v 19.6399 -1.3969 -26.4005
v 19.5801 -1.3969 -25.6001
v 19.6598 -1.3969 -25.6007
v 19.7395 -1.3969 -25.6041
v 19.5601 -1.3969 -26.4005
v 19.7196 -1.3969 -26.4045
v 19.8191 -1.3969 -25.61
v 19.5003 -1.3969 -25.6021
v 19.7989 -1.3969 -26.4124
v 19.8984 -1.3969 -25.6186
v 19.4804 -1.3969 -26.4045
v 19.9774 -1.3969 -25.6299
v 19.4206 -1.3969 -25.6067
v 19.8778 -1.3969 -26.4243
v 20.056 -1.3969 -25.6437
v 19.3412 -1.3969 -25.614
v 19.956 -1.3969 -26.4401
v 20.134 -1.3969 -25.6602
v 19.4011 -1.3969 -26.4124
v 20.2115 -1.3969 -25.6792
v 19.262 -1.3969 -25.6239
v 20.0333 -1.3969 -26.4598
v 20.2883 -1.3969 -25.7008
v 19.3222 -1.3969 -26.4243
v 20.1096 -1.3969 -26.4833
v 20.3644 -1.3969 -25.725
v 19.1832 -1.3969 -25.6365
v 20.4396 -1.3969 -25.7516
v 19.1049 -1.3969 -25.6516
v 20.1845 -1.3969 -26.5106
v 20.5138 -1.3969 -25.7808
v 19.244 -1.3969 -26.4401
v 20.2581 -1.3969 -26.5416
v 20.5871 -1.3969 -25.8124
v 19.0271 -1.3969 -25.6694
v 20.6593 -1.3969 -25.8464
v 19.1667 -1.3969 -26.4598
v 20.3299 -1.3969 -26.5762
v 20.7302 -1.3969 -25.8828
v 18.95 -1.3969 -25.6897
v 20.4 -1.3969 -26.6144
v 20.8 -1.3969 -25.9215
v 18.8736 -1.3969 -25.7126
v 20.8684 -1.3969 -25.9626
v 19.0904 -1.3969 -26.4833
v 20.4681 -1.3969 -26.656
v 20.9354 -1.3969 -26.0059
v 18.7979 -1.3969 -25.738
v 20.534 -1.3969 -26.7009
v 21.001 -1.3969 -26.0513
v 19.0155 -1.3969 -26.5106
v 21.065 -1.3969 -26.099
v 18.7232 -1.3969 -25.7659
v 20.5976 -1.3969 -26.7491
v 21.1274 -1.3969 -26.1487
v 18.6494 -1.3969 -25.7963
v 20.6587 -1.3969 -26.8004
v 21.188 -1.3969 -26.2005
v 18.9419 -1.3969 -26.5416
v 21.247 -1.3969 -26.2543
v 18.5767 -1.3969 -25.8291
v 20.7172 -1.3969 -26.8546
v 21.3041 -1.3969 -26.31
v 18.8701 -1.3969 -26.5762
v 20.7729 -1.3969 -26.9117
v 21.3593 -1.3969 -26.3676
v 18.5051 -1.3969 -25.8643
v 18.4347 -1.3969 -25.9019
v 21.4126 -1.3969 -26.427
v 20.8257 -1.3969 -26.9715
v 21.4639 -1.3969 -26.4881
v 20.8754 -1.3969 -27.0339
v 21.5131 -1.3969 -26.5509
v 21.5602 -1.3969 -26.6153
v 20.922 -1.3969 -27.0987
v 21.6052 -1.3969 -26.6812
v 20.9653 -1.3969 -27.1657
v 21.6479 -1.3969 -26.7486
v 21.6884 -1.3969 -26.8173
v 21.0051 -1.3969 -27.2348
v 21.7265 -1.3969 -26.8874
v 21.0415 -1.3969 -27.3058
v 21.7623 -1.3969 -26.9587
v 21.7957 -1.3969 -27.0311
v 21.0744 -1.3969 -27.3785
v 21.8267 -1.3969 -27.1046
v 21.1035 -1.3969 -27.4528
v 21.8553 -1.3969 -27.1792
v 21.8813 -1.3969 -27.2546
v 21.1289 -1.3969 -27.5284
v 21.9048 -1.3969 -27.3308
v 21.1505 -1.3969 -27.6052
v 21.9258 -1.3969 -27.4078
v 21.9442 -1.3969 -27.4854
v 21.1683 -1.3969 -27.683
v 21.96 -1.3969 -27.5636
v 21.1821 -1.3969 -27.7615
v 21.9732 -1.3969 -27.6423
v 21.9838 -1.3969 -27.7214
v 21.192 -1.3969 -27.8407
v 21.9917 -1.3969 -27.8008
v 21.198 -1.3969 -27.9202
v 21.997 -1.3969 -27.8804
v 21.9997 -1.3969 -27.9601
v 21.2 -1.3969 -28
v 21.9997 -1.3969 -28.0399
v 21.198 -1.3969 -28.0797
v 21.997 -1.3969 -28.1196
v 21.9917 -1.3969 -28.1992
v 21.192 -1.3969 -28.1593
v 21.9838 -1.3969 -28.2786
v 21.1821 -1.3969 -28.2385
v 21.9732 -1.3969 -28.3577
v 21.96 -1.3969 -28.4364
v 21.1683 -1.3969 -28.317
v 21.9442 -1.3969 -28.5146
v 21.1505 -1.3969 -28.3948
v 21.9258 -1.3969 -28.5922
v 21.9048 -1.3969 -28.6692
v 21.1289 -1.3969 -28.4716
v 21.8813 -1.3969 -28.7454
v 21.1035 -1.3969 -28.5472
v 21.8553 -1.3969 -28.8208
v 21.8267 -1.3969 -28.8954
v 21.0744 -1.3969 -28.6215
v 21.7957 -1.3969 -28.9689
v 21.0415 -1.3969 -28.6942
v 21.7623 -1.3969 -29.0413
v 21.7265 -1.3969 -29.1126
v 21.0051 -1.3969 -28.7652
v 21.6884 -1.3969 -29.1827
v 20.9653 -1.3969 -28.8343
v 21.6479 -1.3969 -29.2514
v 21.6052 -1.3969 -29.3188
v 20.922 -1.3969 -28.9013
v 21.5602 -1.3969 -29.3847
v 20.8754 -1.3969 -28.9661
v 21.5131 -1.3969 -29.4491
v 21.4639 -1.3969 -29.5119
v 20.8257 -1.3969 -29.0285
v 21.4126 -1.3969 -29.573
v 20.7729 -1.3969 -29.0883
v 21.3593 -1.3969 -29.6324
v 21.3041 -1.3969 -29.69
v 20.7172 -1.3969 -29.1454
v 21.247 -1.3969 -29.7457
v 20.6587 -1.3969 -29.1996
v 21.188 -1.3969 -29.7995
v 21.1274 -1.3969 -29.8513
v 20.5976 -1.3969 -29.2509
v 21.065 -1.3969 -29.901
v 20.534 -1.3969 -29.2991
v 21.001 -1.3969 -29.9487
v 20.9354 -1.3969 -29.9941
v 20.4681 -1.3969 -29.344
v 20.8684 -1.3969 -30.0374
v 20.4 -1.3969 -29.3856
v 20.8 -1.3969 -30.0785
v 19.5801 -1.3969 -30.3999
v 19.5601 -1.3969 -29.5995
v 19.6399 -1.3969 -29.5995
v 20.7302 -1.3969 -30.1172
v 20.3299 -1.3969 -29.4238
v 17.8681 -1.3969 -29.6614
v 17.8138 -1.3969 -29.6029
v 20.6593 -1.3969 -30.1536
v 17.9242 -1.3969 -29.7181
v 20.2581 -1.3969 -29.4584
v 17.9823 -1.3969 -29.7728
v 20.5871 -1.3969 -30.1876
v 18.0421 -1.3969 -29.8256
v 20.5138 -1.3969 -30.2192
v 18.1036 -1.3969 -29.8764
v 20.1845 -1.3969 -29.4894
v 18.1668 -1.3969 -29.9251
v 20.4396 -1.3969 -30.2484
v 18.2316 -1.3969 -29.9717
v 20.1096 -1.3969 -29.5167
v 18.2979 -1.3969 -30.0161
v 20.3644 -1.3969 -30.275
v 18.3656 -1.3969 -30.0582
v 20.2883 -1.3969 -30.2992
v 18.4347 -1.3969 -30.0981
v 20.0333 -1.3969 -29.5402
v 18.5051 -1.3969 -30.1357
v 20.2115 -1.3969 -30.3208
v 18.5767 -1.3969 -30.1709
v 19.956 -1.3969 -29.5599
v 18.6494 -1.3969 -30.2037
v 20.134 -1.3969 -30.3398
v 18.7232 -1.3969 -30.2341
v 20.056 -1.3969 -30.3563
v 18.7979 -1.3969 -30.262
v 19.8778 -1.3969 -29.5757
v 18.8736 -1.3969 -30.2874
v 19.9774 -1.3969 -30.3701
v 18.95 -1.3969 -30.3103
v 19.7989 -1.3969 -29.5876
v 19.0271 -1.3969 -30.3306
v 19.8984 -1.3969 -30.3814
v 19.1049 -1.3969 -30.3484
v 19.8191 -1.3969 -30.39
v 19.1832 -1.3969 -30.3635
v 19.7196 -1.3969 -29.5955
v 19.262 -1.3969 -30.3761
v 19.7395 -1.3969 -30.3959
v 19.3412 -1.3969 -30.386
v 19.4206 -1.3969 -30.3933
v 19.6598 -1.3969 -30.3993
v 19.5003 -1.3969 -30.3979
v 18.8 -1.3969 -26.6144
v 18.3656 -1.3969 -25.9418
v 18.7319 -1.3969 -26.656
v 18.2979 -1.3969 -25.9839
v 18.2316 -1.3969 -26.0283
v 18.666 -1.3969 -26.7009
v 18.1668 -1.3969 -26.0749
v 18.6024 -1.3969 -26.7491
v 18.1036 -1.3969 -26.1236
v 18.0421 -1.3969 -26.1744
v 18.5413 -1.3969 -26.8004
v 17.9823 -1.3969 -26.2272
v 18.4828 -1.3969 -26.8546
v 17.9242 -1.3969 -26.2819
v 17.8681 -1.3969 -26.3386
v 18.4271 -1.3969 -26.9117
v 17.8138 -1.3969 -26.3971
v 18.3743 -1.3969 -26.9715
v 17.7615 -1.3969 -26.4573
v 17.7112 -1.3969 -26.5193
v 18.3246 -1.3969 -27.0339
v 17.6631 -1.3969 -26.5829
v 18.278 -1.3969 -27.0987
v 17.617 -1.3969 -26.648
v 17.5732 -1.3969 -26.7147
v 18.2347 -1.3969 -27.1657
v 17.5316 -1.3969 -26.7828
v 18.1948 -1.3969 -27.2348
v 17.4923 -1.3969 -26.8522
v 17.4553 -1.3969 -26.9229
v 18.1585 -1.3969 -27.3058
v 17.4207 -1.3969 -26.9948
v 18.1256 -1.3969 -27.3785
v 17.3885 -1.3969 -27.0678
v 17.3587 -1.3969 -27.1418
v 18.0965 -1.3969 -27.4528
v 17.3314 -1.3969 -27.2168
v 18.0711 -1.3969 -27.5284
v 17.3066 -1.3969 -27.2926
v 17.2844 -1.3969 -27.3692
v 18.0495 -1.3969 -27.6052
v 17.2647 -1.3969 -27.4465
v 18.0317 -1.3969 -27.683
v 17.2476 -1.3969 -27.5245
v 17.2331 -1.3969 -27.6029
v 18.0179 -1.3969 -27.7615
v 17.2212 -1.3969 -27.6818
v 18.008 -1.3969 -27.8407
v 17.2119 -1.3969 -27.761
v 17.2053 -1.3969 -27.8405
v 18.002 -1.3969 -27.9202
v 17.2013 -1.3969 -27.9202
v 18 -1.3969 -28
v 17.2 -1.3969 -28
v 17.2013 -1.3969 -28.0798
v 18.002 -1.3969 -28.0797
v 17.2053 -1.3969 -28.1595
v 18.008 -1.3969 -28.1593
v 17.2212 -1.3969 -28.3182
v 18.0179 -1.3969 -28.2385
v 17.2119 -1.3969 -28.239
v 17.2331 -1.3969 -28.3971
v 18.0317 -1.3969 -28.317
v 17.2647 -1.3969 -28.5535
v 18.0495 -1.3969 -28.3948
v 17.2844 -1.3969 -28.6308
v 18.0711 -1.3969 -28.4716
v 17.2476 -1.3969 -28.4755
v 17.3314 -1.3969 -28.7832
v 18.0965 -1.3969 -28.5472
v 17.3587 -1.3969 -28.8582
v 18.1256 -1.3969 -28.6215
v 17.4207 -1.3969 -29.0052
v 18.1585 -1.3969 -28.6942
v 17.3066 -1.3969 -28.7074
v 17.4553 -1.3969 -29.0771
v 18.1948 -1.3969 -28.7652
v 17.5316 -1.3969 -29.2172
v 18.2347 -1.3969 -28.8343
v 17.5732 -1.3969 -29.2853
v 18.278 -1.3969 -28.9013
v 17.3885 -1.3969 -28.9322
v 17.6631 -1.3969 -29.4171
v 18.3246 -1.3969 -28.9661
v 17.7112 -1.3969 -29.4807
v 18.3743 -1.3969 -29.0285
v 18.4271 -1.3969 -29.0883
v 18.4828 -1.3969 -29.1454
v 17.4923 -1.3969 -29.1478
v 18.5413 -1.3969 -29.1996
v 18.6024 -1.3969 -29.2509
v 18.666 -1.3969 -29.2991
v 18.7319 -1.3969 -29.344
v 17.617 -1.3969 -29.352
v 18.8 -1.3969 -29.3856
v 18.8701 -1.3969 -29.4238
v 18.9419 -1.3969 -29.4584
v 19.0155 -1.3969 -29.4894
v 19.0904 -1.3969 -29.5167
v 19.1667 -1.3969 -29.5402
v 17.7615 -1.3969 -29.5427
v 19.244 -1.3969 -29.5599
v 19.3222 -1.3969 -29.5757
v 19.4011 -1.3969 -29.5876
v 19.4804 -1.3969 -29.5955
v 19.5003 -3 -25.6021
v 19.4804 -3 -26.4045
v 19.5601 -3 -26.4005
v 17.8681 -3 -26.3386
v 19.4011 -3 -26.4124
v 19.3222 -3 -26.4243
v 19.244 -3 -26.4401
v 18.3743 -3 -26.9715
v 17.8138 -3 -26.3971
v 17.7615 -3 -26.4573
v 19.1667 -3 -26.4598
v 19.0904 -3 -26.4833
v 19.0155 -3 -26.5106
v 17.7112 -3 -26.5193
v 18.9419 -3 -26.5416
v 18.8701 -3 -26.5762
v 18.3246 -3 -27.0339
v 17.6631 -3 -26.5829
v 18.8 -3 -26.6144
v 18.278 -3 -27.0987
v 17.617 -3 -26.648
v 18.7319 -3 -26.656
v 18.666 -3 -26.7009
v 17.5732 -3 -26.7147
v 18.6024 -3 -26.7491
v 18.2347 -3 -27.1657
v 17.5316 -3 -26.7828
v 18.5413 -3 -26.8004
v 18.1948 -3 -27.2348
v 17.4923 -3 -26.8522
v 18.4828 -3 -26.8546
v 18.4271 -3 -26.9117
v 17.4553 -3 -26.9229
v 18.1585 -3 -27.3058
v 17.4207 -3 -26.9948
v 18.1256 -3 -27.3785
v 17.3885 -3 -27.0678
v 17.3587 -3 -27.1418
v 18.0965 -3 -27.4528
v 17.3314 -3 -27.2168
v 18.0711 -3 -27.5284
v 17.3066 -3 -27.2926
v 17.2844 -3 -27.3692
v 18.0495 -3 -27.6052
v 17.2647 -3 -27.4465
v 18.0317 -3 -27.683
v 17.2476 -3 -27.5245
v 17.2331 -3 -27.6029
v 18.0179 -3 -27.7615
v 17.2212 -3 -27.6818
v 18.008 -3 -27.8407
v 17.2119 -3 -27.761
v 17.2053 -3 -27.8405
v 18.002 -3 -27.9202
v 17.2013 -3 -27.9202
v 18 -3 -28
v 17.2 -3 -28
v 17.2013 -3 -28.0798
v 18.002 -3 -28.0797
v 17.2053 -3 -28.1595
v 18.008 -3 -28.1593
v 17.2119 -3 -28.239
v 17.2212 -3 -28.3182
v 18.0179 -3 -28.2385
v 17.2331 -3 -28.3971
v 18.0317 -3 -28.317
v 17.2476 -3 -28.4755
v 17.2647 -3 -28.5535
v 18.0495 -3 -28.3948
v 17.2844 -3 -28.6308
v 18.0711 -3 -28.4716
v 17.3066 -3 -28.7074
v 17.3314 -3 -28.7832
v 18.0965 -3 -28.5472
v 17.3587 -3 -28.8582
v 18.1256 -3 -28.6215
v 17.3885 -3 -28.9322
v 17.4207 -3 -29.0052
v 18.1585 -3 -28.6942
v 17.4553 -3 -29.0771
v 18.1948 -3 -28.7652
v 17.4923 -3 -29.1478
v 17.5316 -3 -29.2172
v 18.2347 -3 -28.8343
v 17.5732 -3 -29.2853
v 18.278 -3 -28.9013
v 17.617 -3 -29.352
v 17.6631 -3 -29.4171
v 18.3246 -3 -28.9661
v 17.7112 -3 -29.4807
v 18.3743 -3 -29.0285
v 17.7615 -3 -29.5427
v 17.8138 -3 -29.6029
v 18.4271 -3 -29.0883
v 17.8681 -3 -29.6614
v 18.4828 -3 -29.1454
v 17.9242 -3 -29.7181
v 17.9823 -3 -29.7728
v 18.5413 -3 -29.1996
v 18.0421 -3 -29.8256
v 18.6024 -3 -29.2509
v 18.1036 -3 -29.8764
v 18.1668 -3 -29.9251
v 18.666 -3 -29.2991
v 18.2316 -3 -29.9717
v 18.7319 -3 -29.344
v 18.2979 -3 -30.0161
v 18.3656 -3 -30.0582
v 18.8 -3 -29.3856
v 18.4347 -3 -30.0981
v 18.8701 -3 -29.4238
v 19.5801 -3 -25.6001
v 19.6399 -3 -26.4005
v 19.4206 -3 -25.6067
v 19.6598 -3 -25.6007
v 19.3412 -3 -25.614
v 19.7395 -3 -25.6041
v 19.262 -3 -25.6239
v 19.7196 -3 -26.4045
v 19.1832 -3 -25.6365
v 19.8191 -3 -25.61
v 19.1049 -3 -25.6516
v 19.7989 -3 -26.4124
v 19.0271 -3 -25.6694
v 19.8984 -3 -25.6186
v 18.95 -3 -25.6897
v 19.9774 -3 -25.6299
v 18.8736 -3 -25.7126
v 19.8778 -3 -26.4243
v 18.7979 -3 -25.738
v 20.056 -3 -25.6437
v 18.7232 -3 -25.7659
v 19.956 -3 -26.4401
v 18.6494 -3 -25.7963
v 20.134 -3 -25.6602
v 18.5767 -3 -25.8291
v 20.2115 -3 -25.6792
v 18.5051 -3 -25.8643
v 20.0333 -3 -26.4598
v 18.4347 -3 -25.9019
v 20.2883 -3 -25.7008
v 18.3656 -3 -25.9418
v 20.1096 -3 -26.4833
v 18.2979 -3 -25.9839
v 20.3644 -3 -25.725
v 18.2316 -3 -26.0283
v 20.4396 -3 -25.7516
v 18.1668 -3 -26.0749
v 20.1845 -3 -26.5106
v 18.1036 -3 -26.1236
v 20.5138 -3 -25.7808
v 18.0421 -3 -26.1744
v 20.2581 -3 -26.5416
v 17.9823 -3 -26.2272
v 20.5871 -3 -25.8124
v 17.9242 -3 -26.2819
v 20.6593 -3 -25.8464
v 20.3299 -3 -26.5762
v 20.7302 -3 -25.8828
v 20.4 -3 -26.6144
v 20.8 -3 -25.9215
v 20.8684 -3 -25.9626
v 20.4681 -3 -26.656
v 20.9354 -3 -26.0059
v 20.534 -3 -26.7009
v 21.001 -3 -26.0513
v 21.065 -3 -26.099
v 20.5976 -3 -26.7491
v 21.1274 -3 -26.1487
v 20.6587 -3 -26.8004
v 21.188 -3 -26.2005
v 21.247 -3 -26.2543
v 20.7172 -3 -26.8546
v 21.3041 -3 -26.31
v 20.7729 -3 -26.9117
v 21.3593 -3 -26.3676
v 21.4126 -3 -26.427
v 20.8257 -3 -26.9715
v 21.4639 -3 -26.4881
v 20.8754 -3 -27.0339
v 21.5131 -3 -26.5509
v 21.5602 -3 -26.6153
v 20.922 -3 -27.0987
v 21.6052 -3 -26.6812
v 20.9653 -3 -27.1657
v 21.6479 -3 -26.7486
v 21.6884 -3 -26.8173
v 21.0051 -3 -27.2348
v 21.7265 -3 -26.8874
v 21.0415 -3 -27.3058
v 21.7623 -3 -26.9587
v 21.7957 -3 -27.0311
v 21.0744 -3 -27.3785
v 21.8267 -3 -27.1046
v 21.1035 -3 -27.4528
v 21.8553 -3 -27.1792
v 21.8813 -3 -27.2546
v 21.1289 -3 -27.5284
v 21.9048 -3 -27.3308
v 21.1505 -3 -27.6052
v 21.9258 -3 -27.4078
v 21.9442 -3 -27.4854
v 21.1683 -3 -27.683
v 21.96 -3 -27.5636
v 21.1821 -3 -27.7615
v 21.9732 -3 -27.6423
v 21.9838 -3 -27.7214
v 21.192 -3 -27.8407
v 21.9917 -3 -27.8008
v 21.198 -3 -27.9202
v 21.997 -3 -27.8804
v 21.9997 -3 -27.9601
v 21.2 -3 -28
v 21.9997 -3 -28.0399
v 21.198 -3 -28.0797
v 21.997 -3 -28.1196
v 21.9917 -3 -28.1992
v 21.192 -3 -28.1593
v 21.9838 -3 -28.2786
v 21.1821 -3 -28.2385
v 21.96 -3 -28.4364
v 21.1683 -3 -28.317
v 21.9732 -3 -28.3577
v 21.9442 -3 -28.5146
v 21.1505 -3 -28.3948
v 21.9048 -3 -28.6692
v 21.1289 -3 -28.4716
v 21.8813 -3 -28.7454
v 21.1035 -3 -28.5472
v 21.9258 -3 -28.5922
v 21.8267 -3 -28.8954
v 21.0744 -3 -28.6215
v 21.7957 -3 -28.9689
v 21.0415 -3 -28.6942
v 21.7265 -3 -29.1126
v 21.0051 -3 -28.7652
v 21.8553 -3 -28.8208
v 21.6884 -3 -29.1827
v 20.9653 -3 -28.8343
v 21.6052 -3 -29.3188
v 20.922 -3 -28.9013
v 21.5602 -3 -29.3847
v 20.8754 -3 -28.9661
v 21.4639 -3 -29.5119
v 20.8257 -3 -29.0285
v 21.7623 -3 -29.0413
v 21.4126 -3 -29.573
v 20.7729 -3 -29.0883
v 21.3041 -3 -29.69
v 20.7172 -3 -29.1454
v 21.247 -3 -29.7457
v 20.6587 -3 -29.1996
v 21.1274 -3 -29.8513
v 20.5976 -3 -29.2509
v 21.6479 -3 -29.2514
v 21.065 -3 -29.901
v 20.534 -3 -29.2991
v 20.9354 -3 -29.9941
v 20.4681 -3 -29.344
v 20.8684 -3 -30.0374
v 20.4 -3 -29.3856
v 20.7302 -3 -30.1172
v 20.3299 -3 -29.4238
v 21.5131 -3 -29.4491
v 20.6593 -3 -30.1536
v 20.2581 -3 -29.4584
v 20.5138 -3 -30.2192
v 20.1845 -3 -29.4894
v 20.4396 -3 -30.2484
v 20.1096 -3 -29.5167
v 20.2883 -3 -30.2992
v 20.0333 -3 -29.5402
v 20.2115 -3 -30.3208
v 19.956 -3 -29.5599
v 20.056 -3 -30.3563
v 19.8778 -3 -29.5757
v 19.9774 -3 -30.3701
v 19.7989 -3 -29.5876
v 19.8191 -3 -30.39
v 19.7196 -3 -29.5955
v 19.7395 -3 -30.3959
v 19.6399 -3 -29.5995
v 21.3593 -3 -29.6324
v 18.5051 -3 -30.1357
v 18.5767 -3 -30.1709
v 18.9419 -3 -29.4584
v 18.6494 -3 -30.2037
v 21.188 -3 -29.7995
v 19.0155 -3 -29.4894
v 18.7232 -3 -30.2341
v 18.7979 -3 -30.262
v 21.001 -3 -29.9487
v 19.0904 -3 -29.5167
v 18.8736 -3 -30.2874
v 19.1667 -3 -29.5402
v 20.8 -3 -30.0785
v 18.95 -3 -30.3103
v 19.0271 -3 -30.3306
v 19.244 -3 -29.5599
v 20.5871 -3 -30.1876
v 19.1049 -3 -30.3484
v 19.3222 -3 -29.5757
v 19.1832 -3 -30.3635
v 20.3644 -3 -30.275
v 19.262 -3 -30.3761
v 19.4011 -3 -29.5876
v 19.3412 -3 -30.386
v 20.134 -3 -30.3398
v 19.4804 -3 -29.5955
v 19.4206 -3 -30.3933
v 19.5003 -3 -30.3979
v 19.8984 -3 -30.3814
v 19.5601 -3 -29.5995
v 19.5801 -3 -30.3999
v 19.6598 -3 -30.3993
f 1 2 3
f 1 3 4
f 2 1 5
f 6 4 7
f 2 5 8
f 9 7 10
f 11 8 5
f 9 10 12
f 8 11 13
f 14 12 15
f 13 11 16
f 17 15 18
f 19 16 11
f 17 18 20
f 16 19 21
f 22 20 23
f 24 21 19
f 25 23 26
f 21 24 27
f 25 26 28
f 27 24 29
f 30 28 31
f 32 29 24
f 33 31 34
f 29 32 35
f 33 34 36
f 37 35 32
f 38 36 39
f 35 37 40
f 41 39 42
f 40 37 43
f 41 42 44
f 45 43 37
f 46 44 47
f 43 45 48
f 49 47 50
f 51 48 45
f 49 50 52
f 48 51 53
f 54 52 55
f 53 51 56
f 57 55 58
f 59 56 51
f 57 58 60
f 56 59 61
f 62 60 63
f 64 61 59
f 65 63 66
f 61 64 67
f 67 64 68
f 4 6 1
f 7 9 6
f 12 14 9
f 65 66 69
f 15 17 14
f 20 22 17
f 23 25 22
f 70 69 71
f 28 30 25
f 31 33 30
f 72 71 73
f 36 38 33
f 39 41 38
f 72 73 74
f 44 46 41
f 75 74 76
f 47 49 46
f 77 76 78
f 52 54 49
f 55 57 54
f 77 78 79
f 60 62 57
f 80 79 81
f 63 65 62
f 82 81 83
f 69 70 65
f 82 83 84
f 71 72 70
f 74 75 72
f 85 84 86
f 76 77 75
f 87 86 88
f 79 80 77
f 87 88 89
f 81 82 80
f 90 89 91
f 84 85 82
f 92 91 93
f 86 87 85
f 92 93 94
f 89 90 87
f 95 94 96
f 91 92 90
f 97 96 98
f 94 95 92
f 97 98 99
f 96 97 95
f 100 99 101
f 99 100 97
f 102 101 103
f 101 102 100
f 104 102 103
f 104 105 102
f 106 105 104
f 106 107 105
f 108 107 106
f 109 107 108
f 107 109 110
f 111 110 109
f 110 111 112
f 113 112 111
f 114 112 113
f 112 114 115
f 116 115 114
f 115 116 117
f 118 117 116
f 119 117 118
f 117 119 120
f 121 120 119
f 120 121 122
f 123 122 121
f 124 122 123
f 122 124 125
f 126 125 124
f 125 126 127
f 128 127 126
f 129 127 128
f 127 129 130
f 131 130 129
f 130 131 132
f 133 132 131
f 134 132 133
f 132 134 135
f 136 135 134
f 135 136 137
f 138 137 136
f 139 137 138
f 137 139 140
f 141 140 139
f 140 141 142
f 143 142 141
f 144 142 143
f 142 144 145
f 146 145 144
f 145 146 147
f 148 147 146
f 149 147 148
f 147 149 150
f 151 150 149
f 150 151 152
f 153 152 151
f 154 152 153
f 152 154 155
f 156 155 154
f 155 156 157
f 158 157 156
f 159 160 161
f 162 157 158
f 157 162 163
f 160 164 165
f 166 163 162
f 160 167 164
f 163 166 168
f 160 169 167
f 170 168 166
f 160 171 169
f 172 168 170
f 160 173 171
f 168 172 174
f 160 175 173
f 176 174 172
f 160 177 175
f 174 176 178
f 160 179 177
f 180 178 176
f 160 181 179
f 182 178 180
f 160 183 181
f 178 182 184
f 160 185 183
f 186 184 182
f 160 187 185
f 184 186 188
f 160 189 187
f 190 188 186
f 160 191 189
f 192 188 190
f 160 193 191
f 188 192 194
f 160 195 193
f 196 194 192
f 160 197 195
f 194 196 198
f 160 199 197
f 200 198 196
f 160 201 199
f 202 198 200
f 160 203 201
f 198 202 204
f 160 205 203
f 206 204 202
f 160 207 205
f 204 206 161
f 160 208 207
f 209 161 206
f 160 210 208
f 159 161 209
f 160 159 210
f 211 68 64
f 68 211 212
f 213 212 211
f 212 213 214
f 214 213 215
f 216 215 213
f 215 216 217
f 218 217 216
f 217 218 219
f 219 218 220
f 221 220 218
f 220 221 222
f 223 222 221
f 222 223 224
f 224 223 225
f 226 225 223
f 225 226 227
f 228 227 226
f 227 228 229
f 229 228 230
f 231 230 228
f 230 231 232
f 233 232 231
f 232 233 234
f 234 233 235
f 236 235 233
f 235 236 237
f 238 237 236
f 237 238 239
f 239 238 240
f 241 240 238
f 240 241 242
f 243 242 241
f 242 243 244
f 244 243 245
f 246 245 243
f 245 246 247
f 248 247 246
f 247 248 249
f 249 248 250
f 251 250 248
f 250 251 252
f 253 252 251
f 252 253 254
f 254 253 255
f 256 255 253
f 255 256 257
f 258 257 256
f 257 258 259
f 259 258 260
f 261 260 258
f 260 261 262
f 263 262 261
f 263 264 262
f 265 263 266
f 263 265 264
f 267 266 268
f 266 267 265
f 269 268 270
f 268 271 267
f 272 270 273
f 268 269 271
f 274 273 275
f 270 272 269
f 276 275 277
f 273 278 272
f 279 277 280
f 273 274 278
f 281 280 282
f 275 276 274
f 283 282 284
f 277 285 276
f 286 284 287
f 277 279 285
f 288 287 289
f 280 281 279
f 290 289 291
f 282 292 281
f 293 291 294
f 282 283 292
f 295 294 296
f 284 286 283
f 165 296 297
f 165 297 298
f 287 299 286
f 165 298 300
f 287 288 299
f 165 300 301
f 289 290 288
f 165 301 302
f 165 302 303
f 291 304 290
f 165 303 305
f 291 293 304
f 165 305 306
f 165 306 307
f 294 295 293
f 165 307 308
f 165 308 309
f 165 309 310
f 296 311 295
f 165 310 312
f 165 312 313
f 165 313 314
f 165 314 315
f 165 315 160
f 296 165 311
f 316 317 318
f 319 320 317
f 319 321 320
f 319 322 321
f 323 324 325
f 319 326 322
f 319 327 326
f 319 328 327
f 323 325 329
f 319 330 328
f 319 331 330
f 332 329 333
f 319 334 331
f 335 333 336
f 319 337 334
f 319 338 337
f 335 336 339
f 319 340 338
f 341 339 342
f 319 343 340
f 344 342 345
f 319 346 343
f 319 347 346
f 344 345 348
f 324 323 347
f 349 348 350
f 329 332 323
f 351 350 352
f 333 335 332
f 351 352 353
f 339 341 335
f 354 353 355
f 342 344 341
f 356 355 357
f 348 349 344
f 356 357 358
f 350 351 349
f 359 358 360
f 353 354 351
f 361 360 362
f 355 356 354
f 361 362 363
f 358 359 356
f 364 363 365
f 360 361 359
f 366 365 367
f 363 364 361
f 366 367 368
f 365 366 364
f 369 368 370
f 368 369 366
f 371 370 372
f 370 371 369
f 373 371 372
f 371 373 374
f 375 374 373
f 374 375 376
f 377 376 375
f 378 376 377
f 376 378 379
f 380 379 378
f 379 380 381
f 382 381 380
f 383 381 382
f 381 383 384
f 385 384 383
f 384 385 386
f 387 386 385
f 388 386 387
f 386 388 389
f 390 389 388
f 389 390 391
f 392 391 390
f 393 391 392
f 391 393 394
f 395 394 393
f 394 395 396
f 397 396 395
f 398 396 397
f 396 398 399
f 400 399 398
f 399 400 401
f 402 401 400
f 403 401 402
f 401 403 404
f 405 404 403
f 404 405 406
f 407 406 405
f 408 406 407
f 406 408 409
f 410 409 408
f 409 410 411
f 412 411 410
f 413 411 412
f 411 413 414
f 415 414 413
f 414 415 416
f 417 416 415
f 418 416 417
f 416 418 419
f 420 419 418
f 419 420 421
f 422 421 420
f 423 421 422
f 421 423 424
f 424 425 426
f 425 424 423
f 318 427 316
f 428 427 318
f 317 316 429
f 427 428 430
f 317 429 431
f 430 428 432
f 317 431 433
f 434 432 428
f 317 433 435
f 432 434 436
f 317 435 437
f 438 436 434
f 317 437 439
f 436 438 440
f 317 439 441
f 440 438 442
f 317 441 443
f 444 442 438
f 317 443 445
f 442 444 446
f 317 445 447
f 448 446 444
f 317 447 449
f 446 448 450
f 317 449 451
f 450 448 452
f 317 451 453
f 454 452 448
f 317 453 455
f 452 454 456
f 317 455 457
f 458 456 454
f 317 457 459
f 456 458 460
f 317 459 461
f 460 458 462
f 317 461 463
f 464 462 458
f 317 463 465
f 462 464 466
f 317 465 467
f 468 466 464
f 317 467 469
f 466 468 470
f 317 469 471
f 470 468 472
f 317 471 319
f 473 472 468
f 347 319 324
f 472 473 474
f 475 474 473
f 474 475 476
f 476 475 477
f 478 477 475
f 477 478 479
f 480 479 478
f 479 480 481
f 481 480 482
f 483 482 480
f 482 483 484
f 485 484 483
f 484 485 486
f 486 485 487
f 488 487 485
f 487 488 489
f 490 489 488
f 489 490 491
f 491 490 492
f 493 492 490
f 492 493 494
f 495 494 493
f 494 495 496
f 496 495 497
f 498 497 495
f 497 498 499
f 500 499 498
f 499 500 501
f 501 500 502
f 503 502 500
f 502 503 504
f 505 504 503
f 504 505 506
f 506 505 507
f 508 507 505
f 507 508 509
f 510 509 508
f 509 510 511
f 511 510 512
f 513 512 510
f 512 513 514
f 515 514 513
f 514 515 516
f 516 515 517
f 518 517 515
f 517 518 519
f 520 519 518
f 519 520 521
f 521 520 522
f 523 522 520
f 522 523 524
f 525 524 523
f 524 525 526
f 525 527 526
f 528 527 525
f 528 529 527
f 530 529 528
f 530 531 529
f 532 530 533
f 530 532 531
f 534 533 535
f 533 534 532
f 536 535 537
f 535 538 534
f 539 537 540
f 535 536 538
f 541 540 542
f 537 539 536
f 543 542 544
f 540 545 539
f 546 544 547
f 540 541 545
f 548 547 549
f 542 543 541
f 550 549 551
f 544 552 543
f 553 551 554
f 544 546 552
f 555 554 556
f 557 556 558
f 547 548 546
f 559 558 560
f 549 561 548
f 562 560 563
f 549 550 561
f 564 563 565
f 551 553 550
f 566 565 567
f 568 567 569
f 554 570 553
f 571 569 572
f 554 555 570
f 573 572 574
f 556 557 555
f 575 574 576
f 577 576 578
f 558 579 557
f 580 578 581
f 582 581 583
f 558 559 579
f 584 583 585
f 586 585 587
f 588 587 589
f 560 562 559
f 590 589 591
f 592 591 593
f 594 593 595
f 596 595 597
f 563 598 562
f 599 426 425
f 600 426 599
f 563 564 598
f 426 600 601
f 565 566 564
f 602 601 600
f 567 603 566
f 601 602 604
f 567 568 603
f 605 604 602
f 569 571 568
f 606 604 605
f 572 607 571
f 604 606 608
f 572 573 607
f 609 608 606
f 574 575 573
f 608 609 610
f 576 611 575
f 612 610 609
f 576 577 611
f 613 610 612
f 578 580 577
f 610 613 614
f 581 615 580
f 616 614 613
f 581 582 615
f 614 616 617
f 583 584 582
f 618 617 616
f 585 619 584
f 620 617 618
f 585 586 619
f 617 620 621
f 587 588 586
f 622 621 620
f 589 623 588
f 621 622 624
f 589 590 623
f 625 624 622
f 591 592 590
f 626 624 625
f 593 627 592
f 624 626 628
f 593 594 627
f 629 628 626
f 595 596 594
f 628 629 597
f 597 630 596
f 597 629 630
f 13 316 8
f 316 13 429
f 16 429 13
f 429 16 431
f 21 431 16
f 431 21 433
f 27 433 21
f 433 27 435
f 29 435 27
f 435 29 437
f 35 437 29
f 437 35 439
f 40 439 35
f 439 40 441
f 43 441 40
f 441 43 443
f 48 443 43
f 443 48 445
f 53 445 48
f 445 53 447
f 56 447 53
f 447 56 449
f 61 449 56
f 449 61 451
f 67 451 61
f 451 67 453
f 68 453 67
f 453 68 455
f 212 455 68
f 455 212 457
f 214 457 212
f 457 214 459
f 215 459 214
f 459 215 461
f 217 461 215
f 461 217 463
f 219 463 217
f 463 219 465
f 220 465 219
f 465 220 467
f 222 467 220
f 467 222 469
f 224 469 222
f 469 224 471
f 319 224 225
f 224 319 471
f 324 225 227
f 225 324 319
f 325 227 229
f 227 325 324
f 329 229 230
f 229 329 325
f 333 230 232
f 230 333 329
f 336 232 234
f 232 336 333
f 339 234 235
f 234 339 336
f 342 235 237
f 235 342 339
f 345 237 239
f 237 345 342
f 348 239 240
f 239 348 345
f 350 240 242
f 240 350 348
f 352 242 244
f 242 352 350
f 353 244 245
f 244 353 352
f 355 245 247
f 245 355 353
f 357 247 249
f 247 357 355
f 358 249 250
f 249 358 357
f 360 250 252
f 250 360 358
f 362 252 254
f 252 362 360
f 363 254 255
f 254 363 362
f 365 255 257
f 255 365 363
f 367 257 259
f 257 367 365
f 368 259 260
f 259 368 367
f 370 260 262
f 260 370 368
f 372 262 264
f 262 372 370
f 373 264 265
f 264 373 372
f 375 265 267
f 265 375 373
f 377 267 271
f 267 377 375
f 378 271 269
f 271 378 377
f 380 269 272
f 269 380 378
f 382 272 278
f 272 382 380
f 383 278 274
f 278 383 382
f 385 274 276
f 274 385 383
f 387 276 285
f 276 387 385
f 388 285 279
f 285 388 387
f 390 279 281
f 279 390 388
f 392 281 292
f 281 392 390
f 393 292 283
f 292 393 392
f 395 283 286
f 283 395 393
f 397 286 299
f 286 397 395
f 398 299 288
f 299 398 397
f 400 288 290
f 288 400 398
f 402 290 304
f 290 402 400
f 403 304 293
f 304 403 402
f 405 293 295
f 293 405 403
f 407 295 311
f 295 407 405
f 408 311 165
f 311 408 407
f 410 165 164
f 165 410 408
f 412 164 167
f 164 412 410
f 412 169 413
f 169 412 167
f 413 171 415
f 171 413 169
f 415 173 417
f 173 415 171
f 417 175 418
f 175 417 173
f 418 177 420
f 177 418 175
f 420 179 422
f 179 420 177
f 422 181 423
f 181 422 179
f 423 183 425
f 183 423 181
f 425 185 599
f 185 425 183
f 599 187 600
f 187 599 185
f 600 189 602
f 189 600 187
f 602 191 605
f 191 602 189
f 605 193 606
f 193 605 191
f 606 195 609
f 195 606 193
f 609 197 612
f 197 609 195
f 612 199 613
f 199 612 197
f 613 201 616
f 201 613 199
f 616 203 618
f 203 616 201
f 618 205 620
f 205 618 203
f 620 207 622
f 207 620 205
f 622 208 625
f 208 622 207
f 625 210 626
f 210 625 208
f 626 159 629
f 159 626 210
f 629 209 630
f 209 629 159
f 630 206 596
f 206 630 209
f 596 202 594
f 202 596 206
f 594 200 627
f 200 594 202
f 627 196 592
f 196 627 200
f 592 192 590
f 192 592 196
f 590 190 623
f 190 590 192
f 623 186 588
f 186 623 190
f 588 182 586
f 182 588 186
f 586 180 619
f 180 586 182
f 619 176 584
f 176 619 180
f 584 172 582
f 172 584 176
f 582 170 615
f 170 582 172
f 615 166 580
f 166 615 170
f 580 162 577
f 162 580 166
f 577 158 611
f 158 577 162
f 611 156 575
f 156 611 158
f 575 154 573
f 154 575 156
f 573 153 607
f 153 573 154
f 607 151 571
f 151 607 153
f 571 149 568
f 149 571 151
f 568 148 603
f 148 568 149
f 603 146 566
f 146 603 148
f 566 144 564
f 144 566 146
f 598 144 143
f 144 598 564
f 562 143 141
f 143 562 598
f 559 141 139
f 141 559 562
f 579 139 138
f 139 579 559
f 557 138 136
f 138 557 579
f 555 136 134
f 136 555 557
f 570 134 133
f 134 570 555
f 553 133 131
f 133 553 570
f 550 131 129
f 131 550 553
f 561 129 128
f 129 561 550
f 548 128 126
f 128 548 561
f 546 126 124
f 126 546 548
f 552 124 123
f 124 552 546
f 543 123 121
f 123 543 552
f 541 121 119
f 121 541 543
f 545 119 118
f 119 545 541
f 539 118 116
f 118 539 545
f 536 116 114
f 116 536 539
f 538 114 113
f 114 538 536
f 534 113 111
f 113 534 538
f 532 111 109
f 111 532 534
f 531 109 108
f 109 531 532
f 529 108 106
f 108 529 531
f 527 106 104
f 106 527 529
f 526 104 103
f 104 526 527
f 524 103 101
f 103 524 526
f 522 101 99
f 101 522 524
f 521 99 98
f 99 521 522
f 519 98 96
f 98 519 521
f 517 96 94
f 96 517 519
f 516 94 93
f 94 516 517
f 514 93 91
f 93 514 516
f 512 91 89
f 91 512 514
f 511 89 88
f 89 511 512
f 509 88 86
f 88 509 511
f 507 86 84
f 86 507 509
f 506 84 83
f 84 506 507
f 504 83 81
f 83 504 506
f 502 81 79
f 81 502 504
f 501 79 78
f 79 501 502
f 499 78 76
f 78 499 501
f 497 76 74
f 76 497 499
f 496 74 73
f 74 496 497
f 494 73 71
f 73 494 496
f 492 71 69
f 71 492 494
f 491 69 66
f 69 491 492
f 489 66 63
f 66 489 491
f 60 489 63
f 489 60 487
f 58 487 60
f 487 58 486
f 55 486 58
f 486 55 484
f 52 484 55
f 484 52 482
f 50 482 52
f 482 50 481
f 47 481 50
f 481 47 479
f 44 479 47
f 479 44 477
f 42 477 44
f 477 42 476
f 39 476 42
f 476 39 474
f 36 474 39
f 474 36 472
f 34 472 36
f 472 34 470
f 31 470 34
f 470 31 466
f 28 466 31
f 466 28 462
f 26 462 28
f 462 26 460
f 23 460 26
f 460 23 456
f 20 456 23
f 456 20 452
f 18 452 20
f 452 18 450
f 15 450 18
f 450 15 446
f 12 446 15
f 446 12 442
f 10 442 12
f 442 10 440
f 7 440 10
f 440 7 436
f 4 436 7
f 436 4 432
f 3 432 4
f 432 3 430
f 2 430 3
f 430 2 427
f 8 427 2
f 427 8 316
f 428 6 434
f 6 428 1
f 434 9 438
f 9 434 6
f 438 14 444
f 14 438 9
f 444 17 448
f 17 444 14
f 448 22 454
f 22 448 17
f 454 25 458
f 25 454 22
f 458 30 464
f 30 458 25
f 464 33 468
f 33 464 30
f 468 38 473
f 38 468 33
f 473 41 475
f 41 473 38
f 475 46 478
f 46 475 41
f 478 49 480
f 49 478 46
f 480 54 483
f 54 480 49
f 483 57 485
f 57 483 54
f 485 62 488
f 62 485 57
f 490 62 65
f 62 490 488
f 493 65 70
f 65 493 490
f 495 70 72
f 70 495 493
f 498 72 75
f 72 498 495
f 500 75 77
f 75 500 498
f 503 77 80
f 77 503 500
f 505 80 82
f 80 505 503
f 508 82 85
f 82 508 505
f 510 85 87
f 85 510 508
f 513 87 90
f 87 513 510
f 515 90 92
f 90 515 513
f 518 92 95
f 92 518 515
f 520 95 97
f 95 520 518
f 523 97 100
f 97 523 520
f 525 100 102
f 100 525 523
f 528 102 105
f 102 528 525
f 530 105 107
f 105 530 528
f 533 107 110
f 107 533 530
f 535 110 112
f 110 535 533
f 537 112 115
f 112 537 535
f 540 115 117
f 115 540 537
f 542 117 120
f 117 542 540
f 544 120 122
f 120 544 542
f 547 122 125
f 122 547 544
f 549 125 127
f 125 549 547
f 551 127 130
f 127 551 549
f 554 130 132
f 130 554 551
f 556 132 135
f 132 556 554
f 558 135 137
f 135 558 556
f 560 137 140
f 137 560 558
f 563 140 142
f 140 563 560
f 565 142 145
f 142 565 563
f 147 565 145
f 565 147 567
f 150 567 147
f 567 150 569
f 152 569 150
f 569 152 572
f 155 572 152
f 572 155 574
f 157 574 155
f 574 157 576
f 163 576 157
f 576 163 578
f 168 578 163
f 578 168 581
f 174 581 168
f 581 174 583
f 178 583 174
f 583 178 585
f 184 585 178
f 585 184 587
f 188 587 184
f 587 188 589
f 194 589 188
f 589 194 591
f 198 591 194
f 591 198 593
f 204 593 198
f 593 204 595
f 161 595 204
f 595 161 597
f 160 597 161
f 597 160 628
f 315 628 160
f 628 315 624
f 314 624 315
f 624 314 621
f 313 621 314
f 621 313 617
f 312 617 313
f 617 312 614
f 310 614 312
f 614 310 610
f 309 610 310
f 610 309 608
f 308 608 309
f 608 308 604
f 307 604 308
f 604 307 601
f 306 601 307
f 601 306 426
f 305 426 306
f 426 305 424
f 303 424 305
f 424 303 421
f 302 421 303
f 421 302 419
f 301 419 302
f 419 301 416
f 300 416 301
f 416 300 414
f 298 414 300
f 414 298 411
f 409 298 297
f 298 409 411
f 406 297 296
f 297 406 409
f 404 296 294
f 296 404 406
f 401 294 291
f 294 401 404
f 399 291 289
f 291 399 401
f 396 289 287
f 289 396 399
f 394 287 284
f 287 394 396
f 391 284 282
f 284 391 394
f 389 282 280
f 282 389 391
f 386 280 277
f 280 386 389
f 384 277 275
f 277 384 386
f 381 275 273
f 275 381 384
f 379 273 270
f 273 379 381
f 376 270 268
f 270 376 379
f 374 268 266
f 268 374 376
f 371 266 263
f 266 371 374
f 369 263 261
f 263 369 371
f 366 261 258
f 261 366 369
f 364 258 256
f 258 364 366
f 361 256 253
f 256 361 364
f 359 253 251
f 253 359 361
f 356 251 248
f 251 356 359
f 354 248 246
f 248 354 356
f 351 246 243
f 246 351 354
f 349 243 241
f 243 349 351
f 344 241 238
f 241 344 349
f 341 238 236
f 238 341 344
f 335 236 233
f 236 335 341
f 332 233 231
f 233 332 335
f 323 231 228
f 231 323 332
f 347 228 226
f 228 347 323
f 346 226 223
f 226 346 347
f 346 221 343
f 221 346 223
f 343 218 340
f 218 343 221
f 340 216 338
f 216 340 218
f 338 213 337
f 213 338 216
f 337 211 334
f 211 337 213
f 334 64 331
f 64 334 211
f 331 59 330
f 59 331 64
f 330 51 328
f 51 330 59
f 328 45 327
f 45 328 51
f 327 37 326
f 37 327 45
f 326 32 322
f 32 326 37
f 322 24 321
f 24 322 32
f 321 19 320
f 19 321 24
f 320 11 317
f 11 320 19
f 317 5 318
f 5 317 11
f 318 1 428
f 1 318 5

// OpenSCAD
use <../lib.scad>
use <u9086.scad>
use <u9087.scad>
$fa=1; $fs=0.2;
function ldraw_lib__60797c03(realsolid=false) = [
// 0 Door  1 x  4 x  6 with 3 Panes and Stud Handle with ReddishBrown Glass (Complete)
// 0 Name: 60797c03.dat
// 0 Author: Owen Burgoyne [C3POwen]
// 0 !LDRAW_ORG Shortcut UPDATE 2016-01
// 0 !LICENSE Licensed under CC BY 2.0 and CC BY 4.0 : see CAreadme.txt
// 
// 0 BFC CERTIFY CCW
  [0,"BFC","CERTIFY"],
  [0,"BFC","CCW"],
// 
// 0 !HISTORY 2016-12-31 [PTadmin] Official Update 2016-01
// 
// 
// 1 16 0 0 0 1 0 0 0 1 0 0 0 1 u9086.dat
  [1,16,0,0,0,1,0,0,0,1,0,0,0,1, ldraw_lib__u9086(realsolid)],
// 1 70 0 0 0 1 0 0 0 1 0 0 0 1 u9087.dat
  [1,70,0,0,0,1,0,0,0,1,0,0,0,1, ldraw_lib__u9087(realsolid)],
];
module ldraw_lib__60797c03(step=0, col=false, unit=2/5, alt=false, line=0.2, solid=!$preview)
    makepoly(ldraw_lib__60797c03(solid), step=step, col=col, unit=unit, alt=alt, line=line, solid=solid);
ldraw_lib__60797c03(line=0.2);
